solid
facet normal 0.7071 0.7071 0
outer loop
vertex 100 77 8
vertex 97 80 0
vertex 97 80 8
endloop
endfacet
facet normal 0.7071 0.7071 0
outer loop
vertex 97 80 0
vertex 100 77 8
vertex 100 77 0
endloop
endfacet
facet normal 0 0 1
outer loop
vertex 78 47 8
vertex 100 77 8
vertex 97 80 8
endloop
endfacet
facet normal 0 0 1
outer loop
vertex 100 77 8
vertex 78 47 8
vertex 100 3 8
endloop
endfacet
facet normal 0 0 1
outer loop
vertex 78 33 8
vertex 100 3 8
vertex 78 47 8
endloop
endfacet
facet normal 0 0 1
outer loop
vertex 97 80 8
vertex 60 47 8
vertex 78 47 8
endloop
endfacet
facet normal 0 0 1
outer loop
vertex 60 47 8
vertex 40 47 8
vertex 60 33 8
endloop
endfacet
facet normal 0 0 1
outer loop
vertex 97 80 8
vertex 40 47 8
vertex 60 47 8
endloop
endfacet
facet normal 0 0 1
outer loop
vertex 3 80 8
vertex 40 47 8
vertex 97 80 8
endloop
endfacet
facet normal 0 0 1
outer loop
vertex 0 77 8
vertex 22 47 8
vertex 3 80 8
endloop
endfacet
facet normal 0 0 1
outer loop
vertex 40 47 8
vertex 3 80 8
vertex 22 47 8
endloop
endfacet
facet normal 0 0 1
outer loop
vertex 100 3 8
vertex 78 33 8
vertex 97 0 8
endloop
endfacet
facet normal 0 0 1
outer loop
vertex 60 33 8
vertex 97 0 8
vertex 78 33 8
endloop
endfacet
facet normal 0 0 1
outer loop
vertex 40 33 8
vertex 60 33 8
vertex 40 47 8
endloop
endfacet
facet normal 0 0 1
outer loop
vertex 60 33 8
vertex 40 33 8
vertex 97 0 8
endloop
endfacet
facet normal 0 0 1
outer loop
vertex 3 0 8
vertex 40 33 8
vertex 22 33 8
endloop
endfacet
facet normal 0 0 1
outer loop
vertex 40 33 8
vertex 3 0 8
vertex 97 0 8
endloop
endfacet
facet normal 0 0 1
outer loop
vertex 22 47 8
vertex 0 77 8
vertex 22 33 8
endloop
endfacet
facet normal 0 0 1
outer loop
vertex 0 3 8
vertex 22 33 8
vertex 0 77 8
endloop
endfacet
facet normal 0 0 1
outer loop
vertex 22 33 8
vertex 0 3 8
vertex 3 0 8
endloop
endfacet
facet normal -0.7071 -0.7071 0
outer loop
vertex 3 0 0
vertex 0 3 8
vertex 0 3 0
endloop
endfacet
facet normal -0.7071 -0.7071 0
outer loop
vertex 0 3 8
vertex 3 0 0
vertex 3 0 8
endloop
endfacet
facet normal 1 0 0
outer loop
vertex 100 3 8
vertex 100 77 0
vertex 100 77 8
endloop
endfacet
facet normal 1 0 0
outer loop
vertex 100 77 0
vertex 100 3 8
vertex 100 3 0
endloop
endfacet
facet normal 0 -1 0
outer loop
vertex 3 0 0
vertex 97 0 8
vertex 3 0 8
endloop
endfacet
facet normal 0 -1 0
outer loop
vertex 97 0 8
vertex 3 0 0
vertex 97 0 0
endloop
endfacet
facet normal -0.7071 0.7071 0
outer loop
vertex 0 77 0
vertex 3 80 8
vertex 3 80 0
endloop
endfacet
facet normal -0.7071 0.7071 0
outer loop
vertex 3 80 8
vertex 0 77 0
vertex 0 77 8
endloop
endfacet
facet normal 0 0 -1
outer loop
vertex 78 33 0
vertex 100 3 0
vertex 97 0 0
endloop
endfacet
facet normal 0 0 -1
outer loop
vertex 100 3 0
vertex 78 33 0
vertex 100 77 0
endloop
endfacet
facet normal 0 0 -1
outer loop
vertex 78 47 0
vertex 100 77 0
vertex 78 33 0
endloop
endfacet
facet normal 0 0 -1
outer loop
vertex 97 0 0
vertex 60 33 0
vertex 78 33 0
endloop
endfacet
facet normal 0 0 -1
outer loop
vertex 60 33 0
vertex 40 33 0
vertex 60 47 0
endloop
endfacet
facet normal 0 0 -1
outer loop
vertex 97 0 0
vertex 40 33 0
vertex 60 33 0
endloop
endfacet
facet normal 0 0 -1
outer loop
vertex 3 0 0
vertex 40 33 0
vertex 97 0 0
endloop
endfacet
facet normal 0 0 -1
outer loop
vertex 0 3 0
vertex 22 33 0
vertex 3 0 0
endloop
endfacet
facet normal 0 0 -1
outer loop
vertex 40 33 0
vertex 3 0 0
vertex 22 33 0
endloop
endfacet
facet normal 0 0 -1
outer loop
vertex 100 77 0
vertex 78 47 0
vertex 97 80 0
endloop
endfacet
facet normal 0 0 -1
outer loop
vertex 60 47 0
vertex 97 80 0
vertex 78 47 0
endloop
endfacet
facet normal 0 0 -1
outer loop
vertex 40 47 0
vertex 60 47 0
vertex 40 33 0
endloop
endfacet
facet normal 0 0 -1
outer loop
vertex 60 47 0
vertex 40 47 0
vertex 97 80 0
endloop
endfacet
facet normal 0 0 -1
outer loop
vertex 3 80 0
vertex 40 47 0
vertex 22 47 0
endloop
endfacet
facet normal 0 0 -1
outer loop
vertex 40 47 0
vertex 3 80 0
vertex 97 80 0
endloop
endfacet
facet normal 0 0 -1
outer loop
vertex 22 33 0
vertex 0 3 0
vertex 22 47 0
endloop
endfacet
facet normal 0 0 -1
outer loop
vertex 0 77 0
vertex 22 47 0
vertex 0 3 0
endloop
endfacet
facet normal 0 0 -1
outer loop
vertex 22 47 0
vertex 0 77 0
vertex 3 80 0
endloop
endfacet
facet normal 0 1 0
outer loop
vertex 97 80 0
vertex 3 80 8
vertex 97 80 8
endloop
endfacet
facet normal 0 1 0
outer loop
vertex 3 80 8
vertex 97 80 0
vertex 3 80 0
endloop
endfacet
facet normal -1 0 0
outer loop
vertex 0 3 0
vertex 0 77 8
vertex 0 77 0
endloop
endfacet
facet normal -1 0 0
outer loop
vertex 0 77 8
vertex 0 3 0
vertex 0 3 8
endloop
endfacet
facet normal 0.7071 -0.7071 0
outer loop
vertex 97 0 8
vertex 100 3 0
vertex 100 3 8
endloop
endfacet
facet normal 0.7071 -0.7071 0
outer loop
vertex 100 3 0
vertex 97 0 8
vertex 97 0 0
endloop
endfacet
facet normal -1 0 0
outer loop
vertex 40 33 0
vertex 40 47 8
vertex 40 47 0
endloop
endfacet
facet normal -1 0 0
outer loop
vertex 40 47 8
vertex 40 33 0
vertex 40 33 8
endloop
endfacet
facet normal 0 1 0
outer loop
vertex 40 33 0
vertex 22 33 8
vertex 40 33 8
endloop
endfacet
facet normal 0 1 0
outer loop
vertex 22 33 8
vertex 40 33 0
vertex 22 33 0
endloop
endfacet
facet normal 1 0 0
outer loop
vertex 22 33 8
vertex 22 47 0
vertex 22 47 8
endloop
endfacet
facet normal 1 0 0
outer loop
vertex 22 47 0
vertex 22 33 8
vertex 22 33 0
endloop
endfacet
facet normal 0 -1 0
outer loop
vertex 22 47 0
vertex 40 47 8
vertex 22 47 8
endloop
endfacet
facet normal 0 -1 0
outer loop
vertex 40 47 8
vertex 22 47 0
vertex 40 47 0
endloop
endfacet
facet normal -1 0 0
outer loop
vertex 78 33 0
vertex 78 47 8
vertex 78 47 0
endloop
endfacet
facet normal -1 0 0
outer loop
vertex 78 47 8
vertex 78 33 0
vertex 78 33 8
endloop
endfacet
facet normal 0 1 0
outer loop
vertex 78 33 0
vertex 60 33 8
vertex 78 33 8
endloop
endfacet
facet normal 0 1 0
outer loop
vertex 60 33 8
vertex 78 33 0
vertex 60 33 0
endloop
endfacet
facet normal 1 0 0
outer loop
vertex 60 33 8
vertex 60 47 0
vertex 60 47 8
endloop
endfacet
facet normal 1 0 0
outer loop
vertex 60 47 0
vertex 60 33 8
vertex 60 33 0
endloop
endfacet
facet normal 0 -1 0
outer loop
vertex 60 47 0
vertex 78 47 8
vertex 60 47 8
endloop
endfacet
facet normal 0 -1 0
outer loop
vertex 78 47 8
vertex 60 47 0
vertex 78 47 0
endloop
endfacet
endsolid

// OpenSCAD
$fn = 32;

// ----------------------------------------------------------------------
// Windowed plate: 2 voids, 100 x 80 x 8 mm
// ----------------------------------------------------------------------

// --- parameters (mm) ---
plate_l = 100;            // plate length, X
plate_w = 80;             // plate width, Y
plate_t = 8;              // plate thickness, Z
edge_margin = 12;         // wall from the plate edge to any window
windows = 2;              // number of windows in the row
win_l = 18;               // window length
win_w = 14;               // window width
win_pitch = 38;           // window pitch along X
depth_1 = 8;              // depth of void 1 (full thickness = through)
depth_2 = 8;              // depth of void 2 (full thickness = through)
corner_c = 3;             // corner chamfer of the plate

profile = [[3, 0], [97, 0], [100, 3], [100, 77], [97, 80], [3, 80], [0, 77], [0, 3]];  // primary outline, 8 points, counter clockwise
void_1 = [[22, 33], [40, 33], [40, 47], [22, 47]];  // window 1 of the row, 4 points
void_2 = [[60, 33], [78, 33], [78, 47], [60, 47]];  // window 2 of the row, 4 points

// --- the one profile operation ---
difference() {
  linear_extrude(height = plate_t) polygon(points = profile);
  translate([0, 0, -1])
    linear_extrude(height = plate_t + 2) polygon(points = void_1);
  translate([0, 0, -1])
    linear_extrude(height = plate_t + 2) polygon(points = void_2);
}
